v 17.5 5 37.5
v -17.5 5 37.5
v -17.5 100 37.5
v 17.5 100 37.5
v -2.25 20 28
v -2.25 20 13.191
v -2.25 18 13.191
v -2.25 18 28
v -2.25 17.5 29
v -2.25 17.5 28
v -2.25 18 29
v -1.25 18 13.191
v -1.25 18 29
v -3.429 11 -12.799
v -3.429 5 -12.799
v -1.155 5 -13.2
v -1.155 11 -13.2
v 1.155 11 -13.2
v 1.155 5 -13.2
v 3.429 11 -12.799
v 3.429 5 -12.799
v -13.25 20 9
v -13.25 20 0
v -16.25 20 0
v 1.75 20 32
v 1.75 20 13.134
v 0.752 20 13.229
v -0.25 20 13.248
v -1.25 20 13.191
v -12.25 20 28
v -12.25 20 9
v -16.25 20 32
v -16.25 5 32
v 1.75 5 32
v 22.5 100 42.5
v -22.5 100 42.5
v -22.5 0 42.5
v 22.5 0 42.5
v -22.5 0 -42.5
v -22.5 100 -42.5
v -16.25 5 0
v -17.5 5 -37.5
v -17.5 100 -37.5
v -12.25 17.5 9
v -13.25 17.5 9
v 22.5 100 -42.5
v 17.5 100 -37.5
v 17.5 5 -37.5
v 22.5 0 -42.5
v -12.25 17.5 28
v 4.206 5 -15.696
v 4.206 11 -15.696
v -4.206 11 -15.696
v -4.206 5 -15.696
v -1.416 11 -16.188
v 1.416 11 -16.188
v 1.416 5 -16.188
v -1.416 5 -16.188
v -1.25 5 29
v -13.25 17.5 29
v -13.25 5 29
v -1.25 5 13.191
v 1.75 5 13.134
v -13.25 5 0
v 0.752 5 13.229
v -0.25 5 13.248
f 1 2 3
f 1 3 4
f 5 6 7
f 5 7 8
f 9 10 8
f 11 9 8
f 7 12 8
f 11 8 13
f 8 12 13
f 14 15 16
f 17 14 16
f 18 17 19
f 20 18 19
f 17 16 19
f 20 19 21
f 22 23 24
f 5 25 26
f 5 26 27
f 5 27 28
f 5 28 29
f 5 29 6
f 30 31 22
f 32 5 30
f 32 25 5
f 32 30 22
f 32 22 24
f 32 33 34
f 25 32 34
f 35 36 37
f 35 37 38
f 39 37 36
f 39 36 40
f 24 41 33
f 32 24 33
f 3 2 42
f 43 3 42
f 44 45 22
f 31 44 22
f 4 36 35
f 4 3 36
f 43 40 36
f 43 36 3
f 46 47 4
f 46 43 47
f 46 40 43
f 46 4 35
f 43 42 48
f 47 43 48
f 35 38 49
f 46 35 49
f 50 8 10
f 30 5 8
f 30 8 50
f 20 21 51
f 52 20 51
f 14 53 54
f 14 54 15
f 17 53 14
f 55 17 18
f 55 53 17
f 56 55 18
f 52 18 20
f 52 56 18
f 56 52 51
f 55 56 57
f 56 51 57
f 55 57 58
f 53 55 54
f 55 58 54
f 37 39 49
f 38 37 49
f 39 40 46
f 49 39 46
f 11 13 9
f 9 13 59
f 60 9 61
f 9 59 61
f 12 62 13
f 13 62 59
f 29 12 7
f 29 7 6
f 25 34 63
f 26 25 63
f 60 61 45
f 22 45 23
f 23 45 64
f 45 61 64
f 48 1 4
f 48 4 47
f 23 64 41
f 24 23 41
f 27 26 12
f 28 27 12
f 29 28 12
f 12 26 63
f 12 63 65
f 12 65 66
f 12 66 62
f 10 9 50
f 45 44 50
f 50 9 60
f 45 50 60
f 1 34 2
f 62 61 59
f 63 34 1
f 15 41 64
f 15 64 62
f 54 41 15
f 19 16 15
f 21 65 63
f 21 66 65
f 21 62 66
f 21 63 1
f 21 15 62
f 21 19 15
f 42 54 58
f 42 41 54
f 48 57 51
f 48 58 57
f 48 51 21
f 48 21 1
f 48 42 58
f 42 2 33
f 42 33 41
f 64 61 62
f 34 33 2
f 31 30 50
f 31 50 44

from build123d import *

# Parameters (mm, degrees)
SKETCH1_W           = 45
SKETCH1_H           = 85
BOSS_EXTRUDE1_DEPTH = 100
SHELL1_T            = -5
SKETCH2_W           = 3
SKETCH2_H           = 10
BOSS_EXTRUDE2_DEPTH = 15
SKETCH4_W           = 20
SKETCH4_H           = 2.5
BOSS_EXTRUDE3_DEPTH = 1
SKETCH5_W           = 15.809094042
SKETCH5_H           = 2
BOSS_EXTRUDE4_DEPTH = 1
SKETCH6_W           = 10
SKETCH6_H           = 2.5
BOSS_EXTRUDE5_DEPTH = 1
SKETCH9_W           = 10.477527882
SKETCH9_H           = 6.322646136
CUT_EXTRUDE1_DEPTH  = 9


with BuildPart() as part:
    # Sketch1 → Boss-Extrude1 (new body)
    with BuildSketch(Plane(origin=(0, 0, 0), x_dir=(1, 0, 0), z_dir=(0, 1, 0))):
        Rectangle(SKETCH1_W, SKETCH1_H)
    extrude(amount=BOSS_EXTRUDE1_DEPTH)

    # Shell1
    shell1_openings = [part.faces().sort_by_distance(p)[0] for p in [
        (0, 100, 0),
    ]]
    offset(amount=SHELL1_T, openings=shell1_openings, kind=Kind.INTERSECTION)

    # Sketch2 → Boss-Extrude2 (add)
    with BuildSketch(Plane(origin=(0, 5, 0), x_dir=(1, 0, 0), z_dir=(0, 1, 0))):
        with BuildLine():
            Line((-13.25, -29), (-13.25, -24))
            Line((-13.25, -24), (-16.25, -24))
            Line((-16.25, -24), (-16.25, -32))
            Line((-16.25, -32), (1.75, -32))
            Line((1.75, -32), (1.75, -16.155494421))
            ThreePointArc((1.75, -16.155494421), (0.251072202, -16.248060277), (-1.25, -16.201851746))
            Line((-1.25, -16.201851746), (-1.25, -29))
            Line((-1.25, -29), (-13.25, -29))
        make_face()
        with Locations((-14.75, -19)):
            Rectangle(SKETCH2_W, SKETCH2_H)
        with BuildLine():
            Line((-16.25, -14), (-13.25, -14))
            Line((-13.25, -14), (-13.25, -9.407443861))
            ThreePointArc((-13.25, -9.407443861), (-15.481844205, -4.937104415), (-16.25, 0))
            Line((-16.25, 0), (-16.25, -14))
        make_face()
        with BuildLine():
            Line((-4.205809483, 15.696294677), (-3.429352348, 12.798517198))
            ThreePointArc((-3.429352348, 12.798517198), (0, 13.25), (3.429352348, 12.798517198))
            Line((3.429352348, 12.798517198), (4.205809483, 15.696294677))
            ThreePointArc((4.205809483, 15.696294677), (0, 16.25), (-4.205809483, 15.696294677))
        make_face()
        with BuildLine():
            ThreePointArc((-16.25, 0), (-15.481844205, -4.937104415), (-13.25, -9.407443861))
            Line((-13.25, -9.407443861), (-13.25, 0))
            Line((-13.25, 0), (-16.25, 0))
        make_face()
        with BuildLine():
            Line((-1.25, -13.190905958), (-1.25, -16.201851746))
            ThreePointArc((-1.25, -16.201851746), (0.251072202, -16.248060277), (1.75, -16.155494421))
            Line((1.75, -16.155494421), (1.75, -13.133925537))
            ThreePointArc((1.75, -13.133925537), (0.251618147, -13.247610664), (-1.25, -13.190905958))
        make_face()
    extrude(amount=BOSS_EXTRUDE2_DEPTH)

    # Sketch4 → Boss-Extrude3 (add)
    with BuildSketch(Plane(origin=(-13.25, 0, 0), x_dir=(0, 0, -1), z_dir=(1, 0, 0))):
        with Locations((-19, 18.75)):
            Rectangle(SKETCH4_W, SKETCH4_H)
    extrude(amount=BOSS_EXTRUDE3_DEPTH)

    # Sketch5 → Boss-Extrude4 (add)
    with BuildSketch(Plane.ZY.offset(1.25)):
        with Locations((21.095452979, 19)):
            Rectangle(SKETCH5_W, SKETCH5_H)
    extrude(amount=BOSS_EXTRUDE4_DEPTH)

    # Sketch6 → Boss-Extrude5 (add)
    with BuildSketch(Plane(origin=(0, 0, 29), x_dir=(-1, 0, 0), z_dir=(0, 0, -1))):
        with Locations((7.25, 18.75)):
            Rectangle(SKETCH6_W, SKETCH6_H)
    extrude(amount=BOSS_EXTRUDE5_DEPTH)

    # Sketch9 → Cut-Extrude1 (cut)
    with BuildSketch(Plane(origin=(0, 20, 0), x_dir=(1, 0, 0), z_dir=(0, 1, 0))):
        with Locations((0.163497959, 14.216347227)):
            Rectangle(SKETCH9_W, SKETCH9_H)
    extrude(amount=-CUT_EXTRUDE1_DEPTH, mode=Mode.SUBTRACT)


solid = part.part
